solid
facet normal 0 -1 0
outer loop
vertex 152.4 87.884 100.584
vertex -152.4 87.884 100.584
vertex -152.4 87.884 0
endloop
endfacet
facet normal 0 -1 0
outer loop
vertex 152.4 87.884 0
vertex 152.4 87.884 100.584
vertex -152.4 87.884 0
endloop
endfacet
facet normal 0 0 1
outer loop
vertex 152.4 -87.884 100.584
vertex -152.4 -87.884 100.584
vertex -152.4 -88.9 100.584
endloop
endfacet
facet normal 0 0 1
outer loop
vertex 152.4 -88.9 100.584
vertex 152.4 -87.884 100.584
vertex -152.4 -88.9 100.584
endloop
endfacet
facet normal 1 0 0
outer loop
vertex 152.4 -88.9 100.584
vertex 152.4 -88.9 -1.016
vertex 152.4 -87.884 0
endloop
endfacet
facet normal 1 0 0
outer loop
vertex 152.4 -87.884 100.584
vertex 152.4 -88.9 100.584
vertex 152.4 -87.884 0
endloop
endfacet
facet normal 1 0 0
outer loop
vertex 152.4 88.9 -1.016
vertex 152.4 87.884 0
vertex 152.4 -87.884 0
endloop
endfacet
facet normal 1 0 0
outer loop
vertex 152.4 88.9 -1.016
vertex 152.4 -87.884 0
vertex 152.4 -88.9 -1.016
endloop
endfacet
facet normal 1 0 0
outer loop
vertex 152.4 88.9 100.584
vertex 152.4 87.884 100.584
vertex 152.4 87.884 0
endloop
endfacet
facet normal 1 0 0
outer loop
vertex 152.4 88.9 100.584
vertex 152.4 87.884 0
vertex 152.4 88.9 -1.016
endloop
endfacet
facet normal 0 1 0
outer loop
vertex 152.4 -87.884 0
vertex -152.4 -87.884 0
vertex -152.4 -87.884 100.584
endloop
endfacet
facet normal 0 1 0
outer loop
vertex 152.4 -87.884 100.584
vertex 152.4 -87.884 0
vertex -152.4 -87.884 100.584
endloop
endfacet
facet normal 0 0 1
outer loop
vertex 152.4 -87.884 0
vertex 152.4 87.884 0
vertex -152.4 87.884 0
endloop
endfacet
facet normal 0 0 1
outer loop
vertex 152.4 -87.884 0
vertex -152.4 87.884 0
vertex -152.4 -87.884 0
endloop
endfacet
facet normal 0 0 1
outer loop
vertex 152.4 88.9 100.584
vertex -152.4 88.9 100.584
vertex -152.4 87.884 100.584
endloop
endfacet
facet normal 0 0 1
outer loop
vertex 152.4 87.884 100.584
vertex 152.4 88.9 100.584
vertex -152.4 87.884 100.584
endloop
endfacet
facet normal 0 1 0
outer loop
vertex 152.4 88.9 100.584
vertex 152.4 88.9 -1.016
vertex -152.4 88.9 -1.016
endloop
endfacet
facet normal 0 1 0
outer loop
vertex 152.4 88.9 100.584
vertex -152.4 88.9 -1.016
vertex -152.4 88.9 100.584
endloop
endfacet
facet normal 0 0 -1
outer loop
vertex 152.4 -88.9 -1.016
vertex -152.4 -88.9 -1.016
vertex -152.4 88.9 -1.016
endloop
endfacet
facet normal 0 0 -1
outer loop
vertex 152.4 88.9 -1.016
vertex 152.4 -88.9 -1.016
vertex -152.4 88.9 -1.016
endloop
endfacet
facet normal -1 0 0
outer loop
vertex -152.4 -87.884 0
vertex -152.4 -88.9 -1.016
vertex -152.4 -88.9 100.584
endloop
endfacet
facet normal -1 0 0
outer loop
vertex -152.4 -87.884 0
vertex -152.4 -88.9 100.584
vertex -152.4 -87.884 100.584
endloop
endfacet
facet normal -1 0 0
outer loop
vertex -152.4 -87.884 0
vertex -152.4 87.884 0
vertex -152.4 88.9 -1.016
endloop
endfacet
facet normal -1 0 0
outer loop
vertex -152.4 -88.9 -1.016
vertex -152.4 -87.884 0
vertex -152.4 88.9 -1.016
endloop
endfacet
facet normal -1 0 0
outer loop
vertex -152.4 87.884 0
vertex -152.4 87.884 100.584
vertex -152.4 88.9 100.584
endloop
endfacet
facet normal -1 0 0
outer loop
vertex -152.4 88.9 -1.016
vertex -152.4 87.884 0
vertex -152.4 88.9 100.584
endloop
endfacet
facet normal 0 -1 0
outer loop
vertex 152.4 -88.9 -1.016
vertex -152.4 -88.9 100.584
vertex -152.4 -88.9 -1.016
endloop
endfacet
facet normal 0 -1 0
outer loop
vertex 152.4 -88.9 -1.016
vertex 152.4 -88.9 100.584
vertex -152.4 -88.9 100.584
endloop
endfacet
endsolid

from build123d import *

# Parameters (mm, degrees)
PAD_DEPTH = 152.4


with BuildPart() as part:
    # Sketch → Pad (new body, symmetric)
    with BuildSketch(Plane.YZ):
        Polygon((-88.9, 100.584), (-88.9, -1.016), (88.9, -1.016), (88.9, 100.584), (87.884, 100.584), (87.884, 0), (-87.884, 0), (-87.884, 100.584), align=None)
    extrude(amount=PAD_DEPTH, both=True)


solid = part.part
